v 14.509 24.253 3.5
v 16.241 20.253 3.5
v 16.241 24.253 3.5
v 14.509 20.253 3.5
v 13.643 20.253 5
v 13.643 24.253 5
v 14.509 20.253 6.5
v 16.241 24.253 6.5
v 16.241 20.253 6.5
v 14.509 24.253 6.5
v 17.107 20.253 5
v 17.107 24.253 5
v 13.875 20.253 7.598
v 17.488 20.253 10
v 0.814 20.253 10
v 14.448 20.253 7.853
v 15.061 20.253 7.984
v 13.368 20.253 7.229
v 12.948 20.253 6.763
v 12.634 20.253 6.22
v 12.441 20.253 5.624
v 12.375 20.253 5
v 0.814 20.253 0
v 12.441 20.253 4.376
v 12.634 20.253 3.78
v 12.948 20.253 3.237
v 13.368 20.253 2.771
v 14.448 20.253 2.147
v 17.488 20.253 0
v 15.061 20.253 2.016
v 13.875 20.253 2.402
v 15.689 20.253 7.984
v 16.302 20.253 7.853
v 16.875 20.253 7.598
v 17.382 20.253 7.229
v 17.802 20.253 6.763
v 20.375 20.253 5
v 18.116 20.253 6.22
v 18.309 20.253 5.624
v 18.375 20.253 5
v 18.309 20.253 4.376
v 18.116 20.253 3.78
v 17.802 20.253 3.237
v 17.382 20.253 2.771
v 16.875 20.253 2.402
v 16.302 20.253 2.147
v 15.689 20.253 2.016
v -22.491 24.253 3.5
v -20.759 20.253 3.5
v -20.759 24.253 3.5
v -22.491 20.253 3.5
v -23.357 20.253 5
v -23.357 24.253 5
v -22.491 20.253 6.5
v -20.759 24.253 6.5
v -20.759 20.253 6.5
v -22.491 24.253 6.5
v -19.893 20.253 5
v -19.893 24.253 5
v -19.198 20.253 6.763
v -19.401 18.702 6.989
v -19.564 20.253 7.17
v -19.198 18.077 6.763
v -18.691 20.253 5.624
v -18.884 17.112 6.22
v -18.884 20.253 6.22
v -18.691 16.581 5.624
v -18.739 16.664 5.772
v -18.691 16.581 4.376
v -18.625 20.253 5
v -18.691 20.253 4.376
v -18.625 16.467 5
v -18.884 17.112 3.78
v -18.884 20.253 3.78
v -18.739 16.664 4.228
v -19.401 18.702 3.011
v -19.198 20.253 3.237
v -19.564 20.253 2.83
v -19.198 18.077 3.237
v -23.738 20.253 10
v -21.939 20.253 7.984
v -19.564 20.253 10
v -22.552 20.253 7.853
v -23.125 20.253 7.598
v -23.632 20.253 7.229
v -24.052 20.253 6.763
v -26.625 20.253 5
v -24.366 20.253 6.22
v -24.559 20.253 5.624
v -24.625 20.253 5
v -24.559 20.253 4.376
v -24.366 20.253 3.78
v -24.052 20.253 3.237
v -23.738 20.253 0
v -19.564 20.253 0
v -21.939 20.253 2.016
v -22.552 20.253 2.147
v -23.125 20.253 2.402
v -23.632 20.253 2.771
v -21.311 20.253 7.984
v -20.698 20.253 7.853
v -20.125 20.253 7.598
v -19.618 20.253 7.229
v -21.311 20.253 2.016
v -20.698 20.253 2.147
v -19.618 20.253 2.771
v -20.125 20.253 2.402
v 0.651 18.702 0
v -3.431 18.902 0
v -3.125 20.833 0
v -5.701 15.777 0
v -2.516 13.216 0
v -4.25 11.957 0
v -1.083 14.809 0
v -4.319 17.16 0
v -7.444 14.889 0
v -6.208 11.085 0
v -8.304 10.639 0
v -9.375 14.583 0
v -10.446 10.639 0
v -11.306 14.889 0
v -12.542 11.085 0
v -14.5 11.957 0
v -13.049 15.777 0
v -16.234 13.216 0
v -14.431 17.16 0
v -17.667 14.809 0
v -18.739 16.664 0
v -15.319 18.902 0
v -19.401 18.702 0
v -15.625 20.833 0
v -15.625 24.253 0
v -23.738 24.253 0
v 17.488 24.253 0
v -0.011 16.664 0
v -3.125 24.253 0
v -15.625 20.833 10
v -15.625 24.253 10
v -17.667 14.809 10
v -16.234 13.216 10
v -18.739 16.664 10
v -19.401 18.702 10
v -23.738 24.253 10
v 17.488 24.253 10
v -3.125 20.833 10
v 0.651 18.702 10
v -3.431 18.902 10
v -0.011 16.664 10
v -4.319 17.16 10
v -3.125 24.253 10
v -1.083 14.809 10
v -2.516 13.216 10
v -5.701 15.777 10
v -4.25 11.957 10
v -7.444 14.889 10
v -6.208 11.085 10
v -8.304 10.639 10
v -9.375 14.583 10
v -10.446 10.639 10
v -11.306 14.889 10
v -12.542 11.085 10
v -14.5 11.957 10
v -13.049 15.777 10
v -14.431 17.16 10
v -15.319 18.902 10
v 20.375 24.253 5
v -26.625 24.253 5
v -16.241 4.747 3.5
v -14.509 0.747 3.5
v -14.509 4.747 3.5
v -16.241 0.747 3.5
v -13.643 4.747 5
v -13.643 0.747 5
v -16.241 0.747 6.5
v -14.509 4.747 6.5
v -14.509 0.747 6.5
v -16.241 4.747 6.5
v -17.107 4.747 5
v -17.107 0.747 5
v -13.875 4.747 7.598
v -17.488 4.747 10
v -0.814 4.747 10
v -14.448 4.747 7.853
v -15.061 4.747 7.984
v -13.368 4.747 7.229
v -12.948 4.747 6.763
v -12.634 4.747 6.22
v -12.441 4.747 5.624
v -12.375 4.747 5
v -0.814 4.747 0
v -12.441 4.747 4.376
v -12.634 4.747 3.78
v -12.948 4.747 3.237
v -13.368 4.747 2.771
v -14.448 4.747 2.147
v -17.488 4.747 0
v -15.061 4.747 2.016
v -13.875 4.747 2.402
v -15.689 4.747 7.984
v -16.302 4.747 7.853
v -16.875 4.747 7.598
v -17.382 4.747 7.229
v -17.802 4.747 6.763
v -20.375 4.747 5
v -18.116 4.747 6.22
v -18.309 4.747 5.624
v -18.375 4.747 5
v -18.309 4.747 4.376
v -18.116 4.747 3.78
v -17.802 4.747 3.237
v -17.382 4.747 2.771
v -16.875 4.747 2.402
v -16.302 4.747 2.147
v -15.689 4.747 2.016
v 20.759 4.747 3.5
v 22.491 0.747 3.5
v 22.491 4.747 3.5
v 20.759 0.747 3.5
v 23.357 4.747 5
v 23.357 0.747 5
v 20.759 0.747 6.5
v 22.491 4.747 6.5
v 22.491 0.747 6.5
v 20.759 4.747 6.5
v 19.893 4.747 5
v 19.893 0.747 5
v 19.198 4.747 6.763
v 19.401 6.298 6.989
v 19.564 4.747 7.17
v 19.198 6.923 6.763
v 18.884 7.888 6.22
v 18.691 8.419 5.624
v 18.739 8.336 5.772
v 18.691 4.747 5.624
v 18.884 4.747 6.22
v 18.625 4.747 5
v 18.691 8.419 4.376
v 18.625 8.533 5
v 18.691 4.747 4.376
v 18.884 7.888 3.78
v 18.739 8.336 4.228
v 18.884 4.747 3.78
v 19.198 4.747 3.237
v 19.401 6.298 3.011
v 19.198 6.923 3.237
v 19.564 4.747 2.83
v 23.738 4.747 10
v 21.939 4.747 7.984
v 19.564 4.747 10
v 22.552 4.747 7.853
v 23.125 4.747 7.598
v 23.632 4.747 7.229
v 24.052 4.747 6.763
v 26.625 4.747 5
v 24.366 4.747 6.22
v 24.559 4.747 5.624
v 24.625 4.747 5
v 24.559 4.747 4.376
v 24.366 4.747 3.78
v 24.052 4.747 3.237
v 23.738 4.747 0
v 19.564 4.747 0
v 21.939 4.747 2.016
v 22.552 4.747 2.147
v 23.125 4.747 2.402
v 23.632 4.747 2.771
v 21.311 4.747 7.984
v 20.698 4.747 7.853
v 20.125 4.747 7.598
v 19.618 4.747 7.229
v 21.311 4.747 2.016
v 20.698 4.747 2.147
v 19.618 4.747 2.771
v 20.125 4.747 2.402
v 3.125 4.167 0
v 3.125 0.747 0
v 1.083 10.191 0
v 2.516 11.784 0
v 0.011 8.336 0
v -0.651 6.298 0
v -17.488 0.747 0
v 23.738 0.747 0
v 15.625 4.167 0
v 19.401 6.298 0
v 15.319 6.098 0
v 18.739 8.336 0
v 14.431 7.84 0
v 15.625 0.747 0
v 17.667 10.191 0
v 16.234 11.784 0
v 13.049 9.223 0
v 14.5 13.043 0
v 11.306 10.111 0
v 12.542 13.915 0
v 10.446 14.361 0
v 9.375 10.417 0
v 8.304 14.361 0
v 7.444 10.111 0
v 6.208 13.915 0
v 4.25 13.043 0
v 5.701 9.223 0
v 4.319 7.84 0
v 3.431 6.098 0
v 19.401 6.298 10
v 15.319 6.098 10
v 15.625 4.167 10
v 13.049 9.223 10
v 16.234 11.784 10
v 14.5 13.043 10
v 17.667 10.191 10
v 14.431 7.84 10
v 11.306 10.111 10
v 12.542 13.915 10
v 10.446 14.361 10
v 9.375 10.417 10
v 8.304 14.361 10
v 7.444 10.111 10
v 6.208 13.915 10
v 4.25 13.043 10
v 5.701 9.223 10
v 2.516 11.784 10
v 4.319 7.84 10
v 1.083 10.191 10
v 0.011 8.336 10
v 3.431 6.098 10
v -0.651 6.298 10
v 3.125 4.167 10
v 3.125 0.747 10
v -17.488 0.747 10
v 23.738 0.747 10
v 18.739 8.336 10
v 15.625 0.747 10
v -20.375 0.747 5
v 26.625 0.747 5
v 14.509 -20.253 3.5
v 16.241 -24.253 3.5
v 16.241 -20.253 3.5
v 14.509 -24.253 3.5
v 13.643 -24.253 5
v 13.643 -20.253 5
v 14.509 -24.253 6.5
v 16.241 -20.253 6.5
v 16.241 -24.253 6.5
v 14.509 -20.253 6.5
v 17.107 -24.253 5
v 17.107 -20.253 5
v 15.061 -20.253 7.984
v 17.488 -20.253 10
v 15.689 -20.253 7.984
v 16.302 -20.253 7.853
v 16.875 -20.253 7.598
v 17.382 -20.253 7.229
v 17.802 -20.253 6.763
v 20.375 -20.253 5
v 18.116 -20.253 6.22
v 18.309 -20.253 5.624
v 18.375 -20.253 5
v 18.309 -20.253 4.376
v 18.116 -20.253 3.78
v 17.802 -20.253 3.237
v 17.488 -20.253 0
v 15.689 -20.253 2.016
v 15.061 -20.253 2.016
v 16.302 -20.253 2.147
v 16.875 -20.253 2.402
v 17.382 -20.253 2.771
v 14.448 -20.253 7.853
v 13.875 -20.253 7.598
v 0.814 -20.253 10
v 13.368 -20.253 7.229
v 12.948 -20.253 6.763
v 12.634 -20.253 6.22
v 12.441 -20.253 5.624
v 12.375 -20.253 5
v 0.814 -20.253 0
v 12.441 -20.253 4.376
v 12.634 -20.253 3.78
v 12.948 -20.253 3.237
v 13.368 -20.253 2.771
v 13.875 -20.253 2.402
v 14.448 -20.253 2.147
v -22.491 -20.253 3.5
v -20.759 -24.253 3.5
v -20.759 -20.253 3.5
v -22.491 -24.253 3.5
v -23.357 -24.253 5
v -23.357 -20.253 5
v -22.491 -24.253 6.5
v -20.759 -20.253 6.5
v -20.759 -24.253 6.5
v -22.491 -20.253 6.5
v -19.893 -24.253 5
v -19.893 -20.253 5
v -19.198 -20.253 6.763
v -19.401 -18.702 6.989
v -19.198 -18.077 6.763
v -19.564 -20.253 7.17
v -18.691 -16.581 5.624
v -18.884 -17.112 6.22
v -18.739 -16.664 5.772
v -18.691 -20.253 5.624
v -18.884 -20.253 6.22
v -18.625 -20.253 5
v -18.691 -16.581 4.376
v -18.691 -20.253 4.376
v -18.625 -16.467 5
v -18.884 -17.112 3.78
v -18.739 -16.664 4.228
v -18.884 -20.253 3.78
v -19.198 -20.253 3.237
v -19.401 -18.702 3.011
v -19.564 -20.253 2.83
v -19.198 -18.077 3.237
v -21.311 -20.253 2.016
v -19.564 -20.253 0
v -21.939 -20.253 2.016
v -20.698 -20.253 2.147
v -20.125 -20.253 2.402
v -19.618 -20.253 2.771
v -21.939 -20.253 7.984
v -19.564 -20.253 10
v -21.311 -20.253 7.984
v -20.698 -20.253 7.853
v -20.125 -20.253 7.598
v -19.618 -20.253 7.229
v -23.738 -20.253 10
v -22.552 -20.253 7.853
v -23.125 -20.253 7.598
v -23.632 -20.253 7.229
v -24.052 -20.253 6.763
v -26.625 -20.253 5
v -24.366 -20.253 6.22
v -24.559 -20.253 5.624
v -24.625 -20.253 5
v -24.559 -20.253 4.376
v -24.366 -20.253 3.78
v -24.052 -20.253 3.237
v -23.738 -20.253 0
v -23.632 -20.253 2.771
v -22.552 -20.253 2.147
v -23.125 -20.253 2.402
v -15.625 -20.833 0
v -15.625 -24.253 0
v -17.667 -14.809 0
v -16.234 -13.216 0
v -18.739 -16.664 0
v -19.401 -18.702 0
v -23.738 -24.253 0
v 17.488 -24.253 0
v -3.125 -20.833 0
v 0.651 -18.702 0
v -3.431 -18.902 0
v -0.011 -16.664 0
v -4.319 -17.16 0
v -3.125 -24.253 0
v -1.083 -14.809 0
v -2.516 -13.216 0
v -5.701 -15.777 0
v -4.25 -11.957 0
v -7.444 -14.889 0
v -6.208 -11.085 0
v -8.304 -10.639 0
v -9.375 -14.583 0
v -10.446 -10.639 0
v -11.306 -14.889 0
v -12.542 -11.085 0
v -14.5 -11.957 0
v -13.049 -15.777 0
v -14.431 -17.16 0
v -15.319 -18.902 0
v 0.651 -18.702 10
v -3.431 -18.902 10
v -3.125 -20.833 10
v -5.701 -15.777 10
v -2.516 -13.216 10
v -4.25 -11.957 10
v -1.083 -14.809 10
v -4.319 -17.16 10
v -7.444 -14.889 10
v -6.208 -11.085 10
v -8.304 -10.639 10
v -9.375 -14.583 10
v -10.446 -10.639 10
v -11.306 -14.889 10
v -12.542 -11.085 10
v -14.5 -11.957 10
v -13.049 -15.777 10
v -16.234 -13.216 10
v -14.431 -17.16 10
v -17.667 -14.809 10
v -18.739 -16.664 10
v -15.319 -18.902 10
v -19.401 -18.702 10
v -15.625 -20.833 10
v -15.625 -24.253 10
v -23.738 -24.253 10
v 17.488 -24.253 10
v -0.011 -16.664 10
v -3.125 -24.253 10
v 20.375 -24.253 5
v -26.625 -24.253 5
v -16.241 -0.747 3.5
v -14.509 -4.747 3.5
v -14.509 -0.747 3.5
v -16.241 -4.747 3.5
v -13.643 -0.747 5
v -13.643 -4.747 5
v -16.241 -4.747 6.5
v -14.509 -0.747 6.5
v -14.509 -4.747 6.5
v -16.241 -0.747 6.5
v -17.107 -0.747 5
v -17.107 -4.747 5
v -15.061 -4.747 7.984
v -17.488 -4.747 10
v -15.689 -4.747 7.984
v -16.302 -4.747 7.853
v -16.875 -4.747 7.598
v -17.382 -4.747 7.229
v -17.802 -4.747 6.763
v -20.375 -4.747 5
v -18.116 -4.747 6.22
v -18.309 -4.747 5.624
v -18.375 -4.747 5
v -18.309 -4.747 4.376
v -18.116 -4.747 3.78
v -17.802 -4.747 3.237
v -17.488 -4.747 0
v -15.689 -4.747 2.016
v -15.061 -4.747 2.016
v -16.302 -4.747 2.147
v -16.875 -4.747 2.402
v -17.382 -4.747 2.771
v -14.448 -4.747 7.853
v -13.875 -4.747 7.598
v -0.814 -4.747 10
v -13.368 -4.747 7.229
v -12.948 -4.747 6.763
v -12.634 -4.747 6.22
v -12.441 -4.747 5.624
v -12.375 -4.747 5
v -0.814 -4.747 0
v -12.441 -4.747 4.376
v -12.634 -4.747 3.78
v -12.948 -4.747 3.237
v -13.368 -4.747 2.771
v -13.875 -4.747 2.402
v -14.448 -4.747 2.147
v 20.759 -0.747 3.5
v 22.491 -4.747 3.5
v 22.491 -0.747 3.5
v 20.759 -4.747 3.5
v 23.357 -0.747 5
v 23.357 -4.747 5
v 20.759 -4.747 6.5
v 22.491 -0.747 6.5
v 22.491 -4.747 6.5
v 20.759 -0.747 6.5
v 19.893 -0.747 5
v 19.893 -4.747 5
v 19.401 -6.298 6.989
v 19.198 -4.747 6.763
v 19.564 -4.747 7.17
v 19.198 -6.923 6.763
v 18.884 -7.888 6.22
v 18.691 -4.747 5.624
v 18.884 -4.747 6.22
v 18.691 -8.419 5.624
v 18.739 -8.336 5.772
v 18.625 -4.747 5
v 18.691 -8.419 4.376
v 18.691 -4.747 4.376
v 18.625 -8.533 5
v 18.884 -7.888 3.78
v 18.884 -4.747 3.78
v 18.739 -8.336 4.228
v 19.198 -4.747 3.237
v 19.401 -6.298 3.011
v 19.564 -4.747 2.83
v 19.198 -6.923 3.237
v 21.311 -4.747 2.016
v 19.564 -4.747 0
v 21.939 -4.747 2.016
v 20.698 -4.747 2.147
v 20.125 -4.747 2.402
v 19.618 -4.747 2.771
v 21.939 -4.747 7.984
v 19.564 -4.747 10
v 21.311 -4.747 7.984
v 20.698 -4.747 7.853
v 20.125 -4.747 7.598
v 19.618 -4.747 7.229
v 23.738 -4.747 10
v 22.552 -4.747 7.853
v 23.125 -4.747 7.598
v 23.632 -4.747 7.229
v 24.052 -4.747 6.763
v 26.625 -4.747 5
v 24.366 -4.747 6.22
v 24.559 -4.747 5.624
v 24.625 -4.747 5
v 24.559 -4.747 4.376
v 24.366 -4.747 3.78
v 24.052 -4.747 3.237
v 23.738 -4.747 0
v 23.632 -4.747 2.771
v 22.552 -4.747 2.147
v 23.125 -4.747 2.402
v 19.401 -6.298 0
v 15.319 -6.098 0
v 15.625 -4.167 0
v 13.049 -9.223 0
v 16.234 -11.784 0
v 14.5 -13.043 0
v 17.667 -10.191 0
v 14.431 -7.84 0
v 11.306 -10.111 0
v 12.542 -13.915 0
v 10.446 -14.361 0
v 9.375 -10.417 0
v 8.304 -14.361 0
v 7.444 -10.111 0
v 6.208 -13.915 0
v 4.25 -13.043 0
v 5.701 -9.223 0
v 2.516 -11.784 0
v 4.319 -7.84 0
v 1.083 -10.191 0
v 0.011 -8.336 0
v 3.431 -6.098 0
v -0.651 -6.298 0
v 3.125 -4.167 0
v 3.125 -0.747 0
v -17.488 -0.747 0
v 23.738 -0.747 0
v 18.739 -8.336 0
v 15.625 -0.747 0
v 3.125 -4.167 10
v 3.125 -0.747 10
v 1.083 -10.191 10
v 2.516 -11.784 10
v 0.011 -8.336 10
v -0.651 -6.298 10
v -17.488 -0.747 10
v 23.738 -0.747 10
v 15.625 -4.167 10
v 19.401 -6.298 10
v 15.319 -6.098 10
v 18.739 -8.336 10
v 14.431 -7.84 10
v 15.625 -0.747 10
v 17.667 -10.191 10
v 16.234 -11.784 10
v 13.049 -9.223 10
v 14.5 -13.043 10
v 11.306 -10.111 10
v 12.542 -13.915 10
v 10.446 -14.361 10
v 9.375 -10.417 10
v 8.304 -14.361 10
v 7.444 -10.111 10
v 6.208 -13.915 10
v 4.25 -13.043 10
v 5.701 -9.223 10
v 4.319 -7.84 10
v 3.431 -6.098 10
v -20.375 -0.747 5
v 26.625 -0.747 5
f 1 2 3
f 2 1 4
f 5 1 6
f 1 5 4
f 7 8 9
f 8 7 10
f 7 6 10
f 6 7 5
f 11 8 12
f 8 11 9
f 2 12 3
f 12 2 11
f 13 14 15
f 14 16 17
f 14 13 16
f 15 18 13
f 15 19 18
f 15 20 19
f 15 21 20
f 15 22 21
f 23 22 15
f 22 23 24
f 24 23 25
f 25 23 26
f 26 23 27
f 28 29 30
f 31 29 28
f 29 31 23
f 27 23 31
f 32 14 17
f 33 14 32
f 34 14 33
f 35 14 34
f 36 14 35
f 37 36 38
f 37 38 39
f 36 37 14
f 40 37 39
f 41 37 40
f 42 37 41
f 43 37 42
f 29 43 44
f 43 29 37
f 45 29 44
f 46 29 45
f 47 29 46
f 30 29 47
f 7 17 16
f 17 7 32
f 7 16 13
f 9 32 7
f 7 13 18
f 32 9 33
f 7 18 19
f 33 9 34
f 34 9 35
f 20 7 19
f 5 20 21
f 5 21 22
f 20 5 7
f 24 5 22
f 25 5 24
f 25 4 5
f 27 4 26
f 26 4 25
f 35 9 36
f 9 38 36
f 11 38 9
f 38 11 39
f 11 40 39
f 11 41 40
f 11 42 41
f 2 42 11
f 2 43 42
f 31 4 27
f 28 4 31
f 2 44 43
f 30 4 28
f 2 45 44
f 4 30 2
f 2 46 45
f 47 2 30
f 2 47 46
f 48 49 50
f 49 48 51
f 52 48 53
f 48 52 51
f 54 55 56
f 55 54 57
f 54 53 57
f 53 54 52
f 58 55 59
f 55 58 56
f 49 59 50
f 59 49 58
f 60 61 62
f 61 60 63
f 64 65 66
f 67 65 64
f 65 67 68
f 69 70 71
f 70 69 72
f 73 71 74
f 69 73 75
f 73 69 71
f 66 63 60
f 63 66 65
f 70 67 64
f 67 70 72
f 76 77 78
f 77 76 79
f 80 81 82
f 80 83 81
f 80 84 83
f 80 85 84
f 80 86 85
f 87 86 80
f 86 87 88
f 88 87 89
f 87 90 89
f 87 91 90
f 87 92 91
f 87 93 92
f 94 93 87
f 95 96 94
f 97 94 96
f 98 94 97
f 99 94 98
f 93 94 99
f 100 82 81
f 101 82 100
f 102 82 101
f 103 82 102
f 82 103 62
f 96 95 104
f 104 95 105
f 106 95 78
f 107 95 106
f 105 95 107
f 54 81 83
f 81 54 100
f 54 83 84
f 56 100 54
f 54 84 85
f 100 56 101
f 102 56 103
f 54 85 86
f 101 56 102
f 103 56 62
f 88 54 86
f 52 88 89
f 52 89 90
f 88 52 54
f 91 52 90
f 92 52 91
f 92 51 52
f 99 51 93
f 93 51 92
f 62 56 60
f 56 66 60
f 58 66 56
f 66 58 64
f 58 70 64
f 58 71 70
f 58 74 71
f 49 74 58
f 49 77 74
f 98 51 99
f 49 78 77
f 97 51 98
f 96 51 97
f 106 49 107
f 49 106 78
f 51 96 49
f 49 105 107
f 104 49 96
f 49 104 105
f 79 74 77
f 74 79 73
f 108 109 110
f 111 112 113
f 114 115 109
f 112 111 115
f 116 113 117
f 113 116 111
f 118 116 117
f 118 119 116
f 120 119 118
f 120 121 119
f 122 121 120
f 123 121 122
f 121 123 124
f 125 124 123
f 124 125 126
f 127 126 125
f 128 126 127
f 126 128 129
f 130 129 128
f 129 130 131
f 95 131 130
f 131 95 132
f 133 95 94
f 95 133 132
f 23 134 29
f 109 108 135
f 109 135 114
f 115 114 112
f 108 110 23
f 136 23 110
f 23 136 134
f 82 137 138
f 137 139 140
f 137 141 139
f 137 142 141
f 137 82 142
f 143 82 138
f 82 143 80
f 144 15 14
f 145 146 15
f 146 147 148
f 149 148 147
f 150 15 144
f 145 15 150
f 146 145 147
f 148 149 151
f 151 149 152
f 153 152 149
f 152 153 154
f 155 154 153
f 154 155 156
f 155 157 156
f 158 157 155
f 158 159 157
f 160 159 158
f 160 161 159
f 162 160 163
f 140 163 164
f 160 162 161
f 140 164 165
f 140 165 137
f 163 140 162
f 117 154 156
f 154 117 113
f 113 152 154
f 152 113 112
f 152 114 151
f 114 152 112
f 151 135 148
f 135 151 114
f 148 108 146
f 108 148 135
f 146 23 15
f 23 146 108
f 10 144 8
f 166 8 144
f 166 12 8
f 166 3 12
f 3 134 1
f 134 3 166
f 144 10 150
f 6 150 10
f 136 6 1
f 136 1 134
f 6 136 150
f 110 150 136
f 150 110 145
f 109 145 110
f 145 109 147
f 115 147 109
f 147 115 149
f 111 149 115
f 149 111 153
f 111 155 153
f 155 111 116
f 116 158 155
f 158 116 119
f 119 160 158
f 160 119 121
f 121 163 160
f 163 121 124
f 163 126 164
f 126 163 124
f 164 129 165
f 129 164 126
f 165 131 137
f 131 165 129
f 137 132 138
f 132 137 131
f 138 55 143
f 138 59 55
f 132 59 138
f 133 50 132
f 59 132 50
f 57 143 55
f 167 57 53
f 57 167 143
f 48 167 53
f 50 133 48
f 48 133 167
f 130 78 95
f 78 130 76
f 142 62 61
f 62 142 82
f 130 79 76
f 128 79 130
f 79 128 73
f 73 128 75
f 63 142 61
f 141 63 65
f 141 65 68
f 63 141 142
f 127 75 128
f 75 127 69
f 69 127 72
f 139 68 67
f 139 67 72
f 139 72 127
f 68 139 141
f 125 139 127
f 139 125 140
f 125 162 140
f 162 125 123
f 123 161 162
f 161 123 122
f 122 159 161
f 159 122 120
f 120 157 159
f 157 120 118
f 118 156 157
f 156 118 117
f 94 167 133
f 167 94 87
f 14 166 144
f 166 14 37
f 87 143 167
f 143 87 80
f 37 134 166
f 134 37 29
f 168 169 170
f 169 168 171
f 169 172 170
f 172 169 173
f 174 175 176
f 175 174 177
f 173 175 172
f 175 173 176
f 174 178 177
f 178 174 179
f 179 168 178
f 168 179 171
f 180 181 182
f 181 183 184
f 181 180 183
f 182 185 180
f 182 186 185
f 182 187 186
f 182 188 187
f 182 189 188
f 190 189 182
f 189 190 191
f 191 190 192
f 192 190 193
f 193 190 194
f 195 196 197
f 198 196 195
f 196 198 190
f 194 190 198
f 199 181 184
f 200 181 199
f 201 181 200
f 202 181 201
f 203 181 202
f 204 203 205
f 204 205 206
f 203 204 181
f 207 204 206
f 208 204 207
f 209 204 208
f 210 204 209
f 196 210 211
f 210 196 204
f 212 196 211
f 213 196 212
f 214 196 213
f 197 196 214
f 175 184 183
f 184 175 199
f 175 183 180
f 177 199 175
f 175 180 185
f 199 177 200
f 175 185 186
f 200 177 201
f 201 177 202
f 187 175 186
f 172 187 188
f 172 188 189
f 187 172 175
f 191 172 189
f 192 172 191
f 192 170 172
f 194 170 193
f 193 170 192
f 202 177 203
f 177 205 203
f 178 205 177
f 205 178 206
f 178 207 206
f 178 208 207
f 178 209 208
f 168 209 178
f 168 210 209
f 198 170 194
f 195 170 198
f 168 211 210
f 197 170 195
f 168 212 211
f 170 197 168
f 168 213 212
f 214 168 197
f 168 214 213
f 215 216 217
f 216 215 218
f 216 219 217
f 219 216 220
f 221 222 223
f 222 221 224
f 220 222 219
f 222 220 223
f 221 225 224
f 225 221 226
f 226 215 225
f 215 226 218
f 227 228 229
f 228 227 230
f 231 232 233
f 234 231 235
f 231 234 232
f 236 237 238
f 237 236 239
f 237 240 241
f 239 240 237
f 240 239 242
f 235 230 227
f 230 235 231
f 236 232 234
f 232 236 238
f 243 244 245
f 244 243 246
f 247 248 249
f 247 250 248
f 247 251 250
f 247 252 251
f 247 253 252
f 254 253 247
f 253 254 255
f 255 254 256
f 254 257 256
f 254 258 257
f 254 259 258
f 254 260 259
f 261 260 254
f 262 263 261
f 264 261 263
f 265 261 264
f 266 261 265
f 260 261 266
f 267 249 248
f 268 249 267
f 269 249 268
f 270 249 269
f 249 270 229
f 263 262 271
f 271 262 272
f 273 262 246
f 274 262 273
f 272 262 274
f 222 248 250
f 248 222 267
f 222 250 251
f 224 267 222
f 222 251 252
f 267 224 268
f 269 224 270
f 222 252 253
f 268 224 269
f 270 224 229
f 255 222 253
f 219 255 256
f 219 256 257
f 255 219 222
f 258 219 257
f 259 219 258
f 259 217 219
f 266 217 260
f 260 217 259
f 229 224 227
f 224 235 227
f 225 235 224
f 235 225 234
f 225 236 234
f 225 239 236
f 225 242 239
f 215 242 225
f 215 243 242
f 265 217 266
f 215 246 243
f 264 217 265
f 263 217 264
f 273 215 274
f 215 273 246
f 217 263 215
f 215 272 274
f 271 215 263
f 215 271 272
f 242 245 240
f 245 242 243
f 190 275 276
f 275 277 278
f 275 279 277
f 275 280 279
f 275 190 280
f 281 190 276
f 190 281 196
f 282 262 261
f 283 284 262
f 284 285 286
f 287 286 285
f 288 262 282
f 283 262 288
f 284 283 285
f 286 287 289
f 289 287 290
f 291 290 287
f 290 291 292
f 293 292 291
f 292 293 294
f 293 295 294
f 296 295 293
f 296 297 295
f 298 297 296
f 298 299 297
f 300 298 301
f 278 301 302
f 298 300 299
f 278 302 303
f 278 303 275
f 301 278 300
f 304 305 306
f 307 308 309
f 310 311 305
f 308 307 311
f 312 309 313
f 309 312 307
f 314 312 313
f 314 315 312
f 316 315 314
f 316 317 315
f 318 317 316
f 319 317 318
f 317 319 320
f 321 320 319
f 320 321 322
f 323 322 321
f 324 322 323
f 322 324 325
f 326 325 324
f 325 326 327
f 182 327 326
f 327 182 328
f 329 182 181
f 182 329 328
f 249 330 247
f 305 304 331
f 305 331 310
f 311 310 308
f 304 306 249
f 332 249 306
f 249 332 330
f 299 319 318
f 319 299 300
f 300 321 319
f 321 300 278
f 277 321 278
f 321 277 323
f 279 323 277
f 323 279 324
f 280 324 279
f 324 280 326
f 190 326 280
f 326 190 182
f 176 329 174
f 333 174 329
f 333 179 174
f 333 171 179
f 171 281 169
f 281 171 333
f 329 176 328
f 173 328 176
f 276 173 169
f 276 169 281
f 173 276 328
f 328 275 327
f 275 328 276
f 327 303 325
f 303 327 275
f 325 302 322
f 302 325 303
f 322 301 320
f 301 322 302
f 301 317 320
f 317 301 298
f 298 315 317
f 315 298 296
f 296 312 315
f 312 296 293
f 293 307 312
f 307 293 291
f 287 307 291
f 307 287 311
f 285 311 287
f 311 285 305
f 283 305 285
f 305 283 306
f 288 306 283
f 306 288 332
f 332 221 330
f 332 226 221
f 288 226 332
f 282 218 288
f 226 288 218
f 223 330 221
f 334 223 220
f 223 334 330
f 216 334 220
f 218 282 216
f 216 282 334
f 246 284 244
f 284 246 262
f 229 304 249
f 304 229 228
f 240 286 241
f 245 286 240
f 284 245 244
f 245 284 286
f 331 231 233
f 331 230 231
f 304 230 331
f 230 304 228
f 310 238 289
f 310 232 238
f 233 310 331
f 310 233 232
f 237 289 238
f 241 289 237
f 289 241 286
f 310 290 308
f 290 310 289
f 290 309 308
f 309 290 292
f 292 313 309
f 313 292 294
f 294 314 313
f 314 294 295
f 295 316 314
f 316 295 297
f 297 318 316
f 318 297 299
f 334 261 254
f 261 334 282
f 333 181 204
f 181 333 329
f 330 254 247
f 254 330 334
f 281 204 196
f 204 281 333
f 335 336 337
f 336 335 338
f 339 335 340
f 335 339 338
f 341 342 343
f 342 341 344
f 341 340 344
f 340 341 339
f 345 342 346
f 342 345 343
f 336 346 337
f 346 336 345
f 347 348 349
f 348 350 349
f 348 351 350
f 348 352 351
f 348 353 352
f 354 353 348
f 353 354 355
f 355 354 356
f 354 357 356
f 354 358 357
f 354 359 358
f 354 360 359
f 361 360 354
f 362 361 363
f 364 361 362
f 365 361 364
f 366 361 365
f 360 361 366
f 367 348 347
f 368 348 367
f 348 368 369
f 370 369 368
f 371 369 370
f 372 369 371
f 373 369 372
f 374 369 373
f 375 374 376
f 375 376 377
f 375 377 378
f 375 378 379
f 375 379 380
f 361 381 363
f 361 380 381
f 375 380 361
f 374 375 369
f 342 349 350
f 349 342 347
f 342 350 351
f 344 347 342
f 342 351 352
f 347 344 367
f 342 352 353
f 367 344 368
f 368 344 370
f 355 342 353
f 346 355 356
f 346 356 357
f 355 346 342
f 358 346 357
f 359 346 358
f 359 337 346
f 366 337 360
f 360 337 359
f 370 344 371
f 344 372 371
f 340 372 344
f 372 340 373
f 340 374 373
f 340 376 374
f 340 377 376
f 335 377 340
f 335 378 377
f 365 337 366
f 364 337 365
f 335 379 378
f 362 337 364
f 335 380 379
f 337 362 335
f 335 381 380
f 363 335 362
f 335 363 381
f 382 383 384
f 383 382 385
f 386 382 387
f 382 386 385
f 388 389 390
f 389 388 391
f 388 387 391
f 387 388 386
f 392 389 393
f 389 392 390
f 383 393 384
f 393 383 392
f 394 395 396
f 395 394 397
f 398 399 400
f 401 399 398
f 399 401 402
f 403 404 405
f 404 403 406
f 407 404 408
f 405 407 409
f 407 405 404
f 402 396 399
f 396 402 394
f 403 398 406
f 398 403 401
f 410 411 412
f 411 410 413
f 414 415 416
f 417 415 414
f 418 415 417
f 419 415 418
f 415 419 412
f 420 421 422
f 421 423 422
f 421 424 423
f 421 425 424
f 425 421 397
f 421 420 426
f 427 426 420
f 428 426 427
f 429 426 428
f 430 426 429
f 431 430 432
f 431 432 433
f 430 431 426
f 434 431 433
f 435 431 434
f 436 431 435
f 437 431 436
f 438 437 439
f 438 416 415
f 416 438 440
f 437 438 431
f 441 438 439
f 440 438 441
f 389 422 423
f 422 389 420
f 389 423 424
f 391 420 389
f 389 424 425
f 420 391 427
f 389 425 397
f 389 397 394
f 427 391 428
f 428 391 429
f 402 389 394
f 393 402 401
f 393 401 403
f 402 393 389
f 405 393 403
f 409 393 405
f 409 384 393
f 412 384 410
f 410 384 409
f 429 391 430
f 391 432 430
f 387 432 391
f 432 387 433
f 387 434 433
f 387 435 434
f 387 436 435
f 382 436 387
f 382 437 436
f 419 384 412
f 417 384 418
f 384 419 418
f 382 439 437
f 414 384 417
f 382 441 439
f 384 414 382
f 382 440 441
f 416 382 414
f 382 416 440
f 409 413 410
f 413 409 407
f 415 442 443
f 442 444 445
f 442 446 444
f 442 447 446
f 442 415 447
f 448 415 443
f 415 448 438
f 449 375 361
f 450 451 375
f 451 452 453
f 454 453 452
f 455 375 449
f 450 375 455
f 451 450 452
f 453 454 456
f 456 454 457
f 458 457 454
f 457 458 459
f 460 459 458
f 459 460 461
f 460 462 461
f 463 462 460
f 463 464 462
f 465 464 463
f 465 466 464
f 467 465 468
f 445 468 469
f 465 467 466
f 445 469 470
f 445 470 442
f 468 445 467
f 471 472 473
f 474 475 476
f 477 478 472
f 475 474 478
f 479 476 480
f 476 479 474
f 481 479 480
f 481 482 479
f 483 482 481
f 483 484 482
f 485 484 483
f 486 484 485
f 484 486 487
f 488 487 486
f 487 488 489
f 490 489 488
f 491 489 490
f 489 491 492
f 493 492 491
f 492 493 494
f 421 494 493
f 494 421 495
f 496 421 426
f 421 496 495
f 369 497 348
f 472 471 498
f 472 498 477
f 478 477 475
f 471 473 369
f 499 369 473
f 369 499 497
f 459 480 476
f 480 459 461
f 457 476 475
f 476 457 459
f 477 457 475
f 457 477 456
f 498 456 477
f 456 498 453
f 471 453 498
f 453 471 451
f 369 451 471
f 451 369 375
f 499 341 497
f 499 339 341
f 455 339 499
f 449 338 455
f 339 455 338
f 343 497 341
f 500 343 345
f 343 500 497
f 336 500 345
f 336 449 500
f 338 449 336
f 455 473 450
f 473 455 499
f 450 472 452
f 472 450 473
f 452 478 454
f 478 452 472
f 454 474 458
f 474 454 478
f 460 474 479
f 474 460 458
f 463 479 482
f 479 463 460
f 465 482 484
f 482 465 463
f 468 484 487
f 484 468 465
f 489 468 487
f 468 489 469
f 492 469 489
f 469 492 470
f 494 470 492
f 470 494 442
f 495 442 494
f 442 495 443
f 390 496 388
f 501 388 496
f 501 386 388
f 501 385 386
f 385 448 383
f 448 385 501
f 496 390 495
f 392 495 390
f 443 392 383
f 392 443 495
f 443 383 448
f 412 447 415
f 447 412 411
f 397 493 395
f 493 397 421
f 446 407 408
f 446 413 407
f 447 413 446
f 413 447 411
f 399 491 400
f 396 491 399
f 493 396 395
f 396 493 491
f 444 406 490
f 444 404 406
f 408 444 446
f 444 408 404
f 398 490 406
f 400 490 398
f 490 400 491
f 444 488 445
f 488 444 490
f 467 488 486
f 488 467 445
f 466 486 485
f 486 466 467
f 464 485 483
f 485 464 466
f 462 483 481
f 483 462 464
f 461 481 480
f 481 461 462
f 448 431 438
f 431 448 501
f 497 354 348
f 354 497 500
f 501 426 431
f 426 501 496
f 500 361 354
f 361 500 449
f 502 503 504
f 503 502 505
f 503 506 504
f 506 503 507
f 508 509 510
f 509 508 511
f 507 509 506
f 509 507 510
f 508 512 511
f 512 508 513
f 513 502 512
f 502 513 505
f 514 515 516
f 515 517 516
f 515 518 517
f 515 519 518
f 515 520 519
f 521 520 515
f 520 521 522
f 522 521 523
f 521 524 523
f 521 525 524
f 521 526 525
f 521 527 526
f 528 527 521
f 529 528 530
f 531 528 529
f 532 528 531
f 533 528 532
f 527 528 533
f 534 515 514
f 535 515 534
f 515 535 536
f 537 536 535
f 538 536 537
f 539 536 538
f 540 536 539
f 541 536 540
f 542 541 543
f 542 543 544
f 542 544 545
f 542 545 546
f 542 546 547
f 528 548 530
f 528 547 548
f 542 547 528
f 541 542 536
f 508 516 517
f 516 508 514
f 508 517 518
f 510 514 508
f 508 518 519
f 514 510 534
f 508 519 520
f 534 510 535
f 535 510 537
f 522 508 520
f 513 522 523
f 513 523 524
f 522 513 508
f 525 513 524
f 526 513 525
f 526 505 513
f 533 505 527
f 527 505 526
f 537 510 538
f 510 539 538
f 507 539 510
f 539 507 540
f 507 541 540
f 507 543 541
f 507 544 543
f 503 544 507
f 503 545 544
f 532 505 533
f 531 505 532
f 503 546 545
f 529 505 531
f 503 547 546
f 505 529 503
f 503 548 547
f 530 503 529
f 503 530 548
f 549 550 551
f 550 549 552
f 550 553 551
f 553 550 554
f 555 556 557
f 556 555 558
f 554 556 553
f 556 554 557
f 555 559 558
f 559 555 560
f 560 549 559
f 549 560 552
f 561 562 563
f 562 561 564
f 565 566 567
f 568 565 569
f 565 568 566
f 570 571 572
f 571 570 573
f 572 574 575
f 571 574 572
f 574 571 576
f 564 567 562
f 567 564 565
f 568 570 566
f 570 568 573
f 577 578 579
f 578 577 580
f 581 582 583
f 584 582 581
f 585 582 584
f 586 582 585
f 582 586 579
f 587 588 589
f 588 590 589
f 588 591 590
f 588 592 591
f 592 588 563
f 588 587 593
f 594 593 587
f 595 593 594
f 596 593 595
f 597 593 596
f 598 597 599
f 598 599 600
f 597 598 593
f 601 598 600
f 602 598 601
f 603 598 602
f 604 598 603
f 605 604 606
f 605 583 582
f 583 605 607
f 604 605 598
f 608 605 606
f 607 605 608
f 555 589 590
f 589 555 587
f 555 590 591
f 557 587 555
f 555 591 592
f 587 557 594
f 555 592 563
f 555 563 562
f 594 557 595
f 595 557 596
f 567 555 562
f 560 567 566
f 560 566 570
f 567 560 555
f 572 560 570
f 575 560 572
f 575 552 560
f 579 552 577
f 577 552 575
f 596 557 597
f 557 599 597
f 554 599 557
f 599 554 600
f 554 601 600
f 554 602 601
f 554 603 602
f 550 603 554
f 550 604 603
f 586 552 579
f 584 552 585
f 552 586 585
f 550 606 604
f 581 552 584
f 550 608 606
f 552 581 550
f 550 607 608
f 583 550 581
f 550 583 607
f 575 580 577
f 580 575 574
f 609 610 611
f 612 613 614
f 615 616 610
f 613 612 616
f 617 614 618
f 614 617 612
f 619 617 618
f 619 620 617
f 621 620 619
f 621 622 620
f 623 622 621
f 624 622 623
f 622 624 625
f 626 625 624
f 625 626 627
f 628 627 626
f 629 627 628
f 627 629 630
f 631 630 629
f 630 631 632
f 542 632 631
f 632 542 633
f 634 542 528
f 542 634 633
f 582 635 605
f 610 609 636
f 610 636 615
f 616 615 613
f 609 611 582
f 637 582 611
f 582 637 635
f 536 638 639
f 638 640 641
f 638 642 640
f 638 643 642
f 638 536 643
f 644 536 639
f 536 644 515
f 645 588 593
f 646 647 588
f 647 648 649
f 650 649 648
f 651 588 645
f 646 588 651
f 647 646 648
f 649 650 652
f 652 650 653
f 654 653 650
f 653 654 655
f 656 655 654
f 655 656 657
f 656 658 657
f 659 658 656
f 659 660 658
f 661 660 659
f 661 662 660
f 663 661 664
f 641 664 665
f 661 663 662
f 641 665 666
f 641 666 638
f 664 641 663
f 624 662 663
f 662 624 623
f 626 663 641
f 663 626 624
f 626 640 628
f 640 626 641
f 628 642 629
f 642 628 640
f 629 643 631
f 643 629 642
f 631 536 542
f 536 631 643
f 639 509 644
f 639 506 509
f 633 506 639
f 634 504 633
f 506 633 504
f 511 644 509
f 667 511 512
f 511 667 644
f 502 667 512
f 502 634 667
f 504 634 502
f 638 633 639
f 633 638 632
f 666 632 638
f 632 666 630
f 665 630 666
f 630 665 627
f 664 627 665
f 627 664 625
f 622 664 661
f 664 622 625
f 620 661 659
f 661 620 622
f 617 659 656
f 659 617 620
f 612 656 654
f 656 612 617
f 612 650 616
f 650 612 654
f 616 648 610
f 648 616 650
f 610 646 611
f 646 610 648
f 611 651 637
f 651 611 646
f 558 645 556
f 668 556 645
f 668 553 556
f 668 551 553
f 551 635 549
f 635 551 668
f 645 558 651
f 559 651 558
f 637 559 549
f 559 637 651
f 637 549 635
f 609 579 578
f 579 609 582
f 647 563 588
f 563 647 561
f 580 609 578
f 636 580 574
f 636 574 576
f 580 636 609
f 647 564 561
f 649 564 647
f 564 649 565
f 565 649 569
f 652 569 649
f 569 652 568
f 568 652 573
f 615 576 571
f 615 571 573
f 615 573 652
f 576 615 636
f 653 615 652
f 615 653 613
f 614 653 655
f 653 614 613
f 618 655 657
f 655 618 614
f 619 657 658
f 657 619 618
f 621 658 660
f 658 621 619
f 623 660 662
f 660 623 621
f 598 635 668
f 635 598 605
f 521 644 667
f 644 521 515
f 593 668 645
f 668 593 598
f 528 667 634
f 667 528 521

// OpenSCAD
include <wallace.scad>;

!for(b = [0:1]) mirror([0, b, 0]) for(a = [-1,1]) translate([a * bearing_size / 4, bearing_size - (bearing_size * 2/3) * a, 0]) rotate(90 + 90 * a) y_bearing_retainer();
